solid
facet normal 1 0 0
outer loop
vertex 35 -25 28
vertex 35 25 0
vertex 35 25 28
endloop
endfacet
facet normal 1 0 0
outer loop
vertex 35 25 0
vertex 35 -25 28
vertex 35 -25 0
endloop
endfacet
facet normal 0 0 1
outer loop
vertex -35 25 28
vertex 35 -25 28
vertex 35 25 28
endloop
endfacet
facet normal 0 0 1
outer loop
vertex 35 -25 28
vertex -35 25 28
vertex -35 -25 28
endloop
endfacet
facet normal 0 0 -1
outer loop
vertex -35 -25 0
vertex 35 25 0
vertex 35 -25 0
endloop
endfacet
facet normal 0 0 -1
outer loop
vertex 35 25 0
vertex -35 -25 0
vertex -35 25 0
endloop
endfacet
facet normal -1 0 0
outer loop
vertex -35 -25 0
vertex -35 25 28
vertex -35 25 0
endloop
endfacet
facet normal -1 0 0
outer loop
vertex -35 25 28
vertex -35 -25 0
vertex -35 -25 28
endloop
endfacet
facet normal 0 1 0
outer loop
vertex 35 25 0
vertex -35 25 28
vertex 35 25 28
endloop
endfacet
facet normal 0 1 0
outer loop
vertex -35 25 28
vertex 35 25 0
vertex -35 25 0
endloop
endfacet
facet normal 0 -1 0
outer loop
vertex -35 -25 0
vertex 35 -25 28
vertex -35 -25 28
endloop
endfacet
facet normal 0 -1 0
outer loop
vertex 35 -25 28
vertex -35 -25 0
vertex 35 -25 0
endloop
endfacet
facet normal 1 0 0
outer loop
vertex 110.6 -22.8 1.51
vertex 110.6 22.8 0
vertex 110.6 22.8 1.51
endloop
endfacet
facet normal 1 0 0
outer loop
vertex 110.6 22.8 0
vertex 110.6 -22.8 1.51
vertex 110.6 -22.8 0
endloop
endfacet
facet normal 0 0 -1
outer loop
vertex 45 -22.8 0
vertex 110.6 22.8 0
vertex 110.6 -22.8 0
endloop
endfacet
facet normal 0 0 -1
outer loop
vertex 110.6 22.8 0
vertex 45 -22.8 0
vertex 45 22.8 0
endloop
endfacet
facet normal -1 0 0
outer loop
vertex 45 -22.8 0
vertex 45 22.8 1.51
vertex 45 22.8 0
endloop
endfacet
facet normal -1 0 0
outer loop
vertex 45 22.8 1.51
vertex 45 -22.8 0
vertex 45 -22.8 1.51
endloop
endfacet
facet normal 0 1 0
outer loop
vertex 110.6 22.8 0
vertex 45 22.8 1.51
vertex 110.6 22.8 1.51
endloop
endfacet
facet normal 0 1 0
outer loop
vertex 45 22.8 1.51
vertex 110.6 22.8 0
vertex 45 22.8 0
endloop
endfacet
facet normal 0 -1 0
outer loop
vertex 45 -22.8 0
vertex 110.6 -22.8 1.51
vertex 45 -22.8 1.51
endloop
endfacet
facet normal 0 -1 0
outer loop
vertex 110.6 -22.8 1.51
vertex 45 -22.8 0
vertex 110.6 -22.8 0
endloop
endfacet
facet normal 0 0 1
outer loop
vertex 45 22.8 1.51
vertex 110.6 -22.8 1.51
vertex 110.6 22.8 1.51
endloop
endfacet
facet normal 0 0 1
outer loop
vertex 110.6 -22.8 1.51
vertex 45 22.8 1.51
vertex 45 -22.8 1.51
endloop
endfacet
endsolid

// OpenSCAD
// Two-part enclosure for a small electronics board (e.g. Arduino-based temperature logger)
// Print orientation: box upright, lid upside-down (plated side down) so they fuse together.
// Units: mm

// ---------------- Parameters ----------------
box_x      = 70;    // box outer length (X)
box_y      = 50;    // box outer width (Y)
box_h      = 30;    // box outer height (Z)
wall       = 2;     // box wall thickness
floor      = 2;     // box floor thickness
lip_t      = 1.5;   // lid lip wall thickness
lip_h      = 4;     // lid lip height (from plate top)
lip_x      = 65.6;  // lid lip outer length (X)
lip_y      = 45.6;  // lid lip outer width (Y)
clearance  = 0.2;   // side clearance between lip and box opening
gap        = 10;    // horizontal gap between box and lid on the bed
eps        = 0.5;   // cutter overshoot past faces

$fn = 64;

// Derived: lid plate thickness = lip_t + 0.01 (plate fuses into the lip wall)
lid_plt_t = lip_t + 0.01;

// ---------------- Model ----------------
difference() {
    union() {
        // Part 1: Box (open top)
        translate([-box_x/2, -box_y/2, 0])
            cube([box_x, box_y, box_h - floor]);   // floor included in height

        // Part 2: Lid (upside-down: plate with a lip that overhangs the plate)
        translate([box_x/2 + gap, -lip_y/2, 0])
            cube([lip_x, lip_y, lid_plt_t]);       // base plate
        translate([box_x/2 + gap, -lip_y/2, lid_plt_t])
            cube([lip_x, lip_y, lip_h]);           // lip standing on the plate
    }

    // Cut the lip's cavity so it slides into the box opening with the set clearance
    translate([box_x/2 + gap - clearance, -lip_y/2 - clearance, lid_plt_t])
        cube([lip_x + 2*clearance, lip_y + 2*clearance, lip_h + eps]);
}
